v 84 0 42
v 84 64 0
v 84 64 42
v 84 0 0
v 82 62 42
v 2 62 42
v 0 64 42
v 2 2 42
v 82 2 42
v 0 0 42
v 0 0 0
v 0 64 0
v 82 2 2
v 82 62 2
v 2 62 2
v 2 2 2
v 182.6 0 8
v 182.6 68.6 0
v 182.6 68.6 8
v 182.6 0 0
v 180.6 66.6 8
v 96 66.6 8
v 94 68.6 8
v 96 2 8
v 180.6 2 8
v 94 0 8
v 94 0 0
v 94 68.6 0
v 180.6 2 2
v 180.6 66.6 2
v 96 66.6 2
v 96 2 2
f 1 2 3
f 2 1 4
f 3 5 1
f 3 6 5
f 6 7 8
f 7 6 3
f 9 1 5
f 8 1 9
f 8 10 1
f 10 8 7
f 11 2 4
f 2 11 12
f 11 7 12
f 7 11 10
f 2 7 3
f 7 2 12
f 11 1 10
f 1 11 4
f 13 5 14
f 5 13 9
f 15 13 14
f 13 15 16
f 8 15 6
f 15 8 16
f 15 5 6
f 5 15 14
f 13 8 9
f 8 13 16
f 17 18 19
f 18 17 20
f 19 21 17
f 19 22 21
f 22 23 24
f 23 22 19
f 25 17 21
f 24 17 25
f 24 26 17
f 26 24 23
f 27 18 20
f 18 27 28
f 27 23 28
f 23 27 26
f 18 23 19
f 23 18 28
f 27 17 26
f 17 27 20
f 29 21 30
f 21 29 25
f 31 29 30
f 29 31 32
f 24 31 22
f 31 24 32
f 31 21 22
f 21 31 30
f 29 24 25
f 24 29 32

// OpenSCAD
// Scatola con coperchio a incastro: la scatola e, accanto, il coperchio da stampare capovolto.
larghezza = 80;      // misure interne
profondita = 60;
altezza = 40;
pareti = 2;
scomparti = 1;       // divisori lungo la larghezza
tolleranza = 0.3;    // gioco tra coperchio e scatola

fondo = 2;
bordo = 6;           // altezza del bordo del coperchio
$fn = 32;

L = larghezza + 2 * pareti;
P = profondita + 2 * pareti;

module scatola() {
    difference() {
        cube([L, P, altezza + fondo]);
        translate([pareti, pareti, fondo]) cube([larghezza, profondita, altezza + 1]);
    }
    if (scomparti > 1)
        for (i = [1 : scomparti - 1])
            translate([pareti + i * larghezza / scomparti - pareti / 2, pareti, 0])
                cube([pareti, profondita, altezza * 0.85 + fondo]);
}

module coperchio() {
    Lc = L + 2 * tolleranza + 2 * pareti;
    Pc = P + 2 * tolleranza + 2 * pareti;
    difference() {
        cube([Lc, Pc, bordo + fondo]);
        translate([pareti, pareti, fondo]) cube([L + 2 * tolleranza, P + 2 * tolleranza, bordo + 1]);
    }
}

scatola();
translate([L + 10, 0, 0]) coperchio();
